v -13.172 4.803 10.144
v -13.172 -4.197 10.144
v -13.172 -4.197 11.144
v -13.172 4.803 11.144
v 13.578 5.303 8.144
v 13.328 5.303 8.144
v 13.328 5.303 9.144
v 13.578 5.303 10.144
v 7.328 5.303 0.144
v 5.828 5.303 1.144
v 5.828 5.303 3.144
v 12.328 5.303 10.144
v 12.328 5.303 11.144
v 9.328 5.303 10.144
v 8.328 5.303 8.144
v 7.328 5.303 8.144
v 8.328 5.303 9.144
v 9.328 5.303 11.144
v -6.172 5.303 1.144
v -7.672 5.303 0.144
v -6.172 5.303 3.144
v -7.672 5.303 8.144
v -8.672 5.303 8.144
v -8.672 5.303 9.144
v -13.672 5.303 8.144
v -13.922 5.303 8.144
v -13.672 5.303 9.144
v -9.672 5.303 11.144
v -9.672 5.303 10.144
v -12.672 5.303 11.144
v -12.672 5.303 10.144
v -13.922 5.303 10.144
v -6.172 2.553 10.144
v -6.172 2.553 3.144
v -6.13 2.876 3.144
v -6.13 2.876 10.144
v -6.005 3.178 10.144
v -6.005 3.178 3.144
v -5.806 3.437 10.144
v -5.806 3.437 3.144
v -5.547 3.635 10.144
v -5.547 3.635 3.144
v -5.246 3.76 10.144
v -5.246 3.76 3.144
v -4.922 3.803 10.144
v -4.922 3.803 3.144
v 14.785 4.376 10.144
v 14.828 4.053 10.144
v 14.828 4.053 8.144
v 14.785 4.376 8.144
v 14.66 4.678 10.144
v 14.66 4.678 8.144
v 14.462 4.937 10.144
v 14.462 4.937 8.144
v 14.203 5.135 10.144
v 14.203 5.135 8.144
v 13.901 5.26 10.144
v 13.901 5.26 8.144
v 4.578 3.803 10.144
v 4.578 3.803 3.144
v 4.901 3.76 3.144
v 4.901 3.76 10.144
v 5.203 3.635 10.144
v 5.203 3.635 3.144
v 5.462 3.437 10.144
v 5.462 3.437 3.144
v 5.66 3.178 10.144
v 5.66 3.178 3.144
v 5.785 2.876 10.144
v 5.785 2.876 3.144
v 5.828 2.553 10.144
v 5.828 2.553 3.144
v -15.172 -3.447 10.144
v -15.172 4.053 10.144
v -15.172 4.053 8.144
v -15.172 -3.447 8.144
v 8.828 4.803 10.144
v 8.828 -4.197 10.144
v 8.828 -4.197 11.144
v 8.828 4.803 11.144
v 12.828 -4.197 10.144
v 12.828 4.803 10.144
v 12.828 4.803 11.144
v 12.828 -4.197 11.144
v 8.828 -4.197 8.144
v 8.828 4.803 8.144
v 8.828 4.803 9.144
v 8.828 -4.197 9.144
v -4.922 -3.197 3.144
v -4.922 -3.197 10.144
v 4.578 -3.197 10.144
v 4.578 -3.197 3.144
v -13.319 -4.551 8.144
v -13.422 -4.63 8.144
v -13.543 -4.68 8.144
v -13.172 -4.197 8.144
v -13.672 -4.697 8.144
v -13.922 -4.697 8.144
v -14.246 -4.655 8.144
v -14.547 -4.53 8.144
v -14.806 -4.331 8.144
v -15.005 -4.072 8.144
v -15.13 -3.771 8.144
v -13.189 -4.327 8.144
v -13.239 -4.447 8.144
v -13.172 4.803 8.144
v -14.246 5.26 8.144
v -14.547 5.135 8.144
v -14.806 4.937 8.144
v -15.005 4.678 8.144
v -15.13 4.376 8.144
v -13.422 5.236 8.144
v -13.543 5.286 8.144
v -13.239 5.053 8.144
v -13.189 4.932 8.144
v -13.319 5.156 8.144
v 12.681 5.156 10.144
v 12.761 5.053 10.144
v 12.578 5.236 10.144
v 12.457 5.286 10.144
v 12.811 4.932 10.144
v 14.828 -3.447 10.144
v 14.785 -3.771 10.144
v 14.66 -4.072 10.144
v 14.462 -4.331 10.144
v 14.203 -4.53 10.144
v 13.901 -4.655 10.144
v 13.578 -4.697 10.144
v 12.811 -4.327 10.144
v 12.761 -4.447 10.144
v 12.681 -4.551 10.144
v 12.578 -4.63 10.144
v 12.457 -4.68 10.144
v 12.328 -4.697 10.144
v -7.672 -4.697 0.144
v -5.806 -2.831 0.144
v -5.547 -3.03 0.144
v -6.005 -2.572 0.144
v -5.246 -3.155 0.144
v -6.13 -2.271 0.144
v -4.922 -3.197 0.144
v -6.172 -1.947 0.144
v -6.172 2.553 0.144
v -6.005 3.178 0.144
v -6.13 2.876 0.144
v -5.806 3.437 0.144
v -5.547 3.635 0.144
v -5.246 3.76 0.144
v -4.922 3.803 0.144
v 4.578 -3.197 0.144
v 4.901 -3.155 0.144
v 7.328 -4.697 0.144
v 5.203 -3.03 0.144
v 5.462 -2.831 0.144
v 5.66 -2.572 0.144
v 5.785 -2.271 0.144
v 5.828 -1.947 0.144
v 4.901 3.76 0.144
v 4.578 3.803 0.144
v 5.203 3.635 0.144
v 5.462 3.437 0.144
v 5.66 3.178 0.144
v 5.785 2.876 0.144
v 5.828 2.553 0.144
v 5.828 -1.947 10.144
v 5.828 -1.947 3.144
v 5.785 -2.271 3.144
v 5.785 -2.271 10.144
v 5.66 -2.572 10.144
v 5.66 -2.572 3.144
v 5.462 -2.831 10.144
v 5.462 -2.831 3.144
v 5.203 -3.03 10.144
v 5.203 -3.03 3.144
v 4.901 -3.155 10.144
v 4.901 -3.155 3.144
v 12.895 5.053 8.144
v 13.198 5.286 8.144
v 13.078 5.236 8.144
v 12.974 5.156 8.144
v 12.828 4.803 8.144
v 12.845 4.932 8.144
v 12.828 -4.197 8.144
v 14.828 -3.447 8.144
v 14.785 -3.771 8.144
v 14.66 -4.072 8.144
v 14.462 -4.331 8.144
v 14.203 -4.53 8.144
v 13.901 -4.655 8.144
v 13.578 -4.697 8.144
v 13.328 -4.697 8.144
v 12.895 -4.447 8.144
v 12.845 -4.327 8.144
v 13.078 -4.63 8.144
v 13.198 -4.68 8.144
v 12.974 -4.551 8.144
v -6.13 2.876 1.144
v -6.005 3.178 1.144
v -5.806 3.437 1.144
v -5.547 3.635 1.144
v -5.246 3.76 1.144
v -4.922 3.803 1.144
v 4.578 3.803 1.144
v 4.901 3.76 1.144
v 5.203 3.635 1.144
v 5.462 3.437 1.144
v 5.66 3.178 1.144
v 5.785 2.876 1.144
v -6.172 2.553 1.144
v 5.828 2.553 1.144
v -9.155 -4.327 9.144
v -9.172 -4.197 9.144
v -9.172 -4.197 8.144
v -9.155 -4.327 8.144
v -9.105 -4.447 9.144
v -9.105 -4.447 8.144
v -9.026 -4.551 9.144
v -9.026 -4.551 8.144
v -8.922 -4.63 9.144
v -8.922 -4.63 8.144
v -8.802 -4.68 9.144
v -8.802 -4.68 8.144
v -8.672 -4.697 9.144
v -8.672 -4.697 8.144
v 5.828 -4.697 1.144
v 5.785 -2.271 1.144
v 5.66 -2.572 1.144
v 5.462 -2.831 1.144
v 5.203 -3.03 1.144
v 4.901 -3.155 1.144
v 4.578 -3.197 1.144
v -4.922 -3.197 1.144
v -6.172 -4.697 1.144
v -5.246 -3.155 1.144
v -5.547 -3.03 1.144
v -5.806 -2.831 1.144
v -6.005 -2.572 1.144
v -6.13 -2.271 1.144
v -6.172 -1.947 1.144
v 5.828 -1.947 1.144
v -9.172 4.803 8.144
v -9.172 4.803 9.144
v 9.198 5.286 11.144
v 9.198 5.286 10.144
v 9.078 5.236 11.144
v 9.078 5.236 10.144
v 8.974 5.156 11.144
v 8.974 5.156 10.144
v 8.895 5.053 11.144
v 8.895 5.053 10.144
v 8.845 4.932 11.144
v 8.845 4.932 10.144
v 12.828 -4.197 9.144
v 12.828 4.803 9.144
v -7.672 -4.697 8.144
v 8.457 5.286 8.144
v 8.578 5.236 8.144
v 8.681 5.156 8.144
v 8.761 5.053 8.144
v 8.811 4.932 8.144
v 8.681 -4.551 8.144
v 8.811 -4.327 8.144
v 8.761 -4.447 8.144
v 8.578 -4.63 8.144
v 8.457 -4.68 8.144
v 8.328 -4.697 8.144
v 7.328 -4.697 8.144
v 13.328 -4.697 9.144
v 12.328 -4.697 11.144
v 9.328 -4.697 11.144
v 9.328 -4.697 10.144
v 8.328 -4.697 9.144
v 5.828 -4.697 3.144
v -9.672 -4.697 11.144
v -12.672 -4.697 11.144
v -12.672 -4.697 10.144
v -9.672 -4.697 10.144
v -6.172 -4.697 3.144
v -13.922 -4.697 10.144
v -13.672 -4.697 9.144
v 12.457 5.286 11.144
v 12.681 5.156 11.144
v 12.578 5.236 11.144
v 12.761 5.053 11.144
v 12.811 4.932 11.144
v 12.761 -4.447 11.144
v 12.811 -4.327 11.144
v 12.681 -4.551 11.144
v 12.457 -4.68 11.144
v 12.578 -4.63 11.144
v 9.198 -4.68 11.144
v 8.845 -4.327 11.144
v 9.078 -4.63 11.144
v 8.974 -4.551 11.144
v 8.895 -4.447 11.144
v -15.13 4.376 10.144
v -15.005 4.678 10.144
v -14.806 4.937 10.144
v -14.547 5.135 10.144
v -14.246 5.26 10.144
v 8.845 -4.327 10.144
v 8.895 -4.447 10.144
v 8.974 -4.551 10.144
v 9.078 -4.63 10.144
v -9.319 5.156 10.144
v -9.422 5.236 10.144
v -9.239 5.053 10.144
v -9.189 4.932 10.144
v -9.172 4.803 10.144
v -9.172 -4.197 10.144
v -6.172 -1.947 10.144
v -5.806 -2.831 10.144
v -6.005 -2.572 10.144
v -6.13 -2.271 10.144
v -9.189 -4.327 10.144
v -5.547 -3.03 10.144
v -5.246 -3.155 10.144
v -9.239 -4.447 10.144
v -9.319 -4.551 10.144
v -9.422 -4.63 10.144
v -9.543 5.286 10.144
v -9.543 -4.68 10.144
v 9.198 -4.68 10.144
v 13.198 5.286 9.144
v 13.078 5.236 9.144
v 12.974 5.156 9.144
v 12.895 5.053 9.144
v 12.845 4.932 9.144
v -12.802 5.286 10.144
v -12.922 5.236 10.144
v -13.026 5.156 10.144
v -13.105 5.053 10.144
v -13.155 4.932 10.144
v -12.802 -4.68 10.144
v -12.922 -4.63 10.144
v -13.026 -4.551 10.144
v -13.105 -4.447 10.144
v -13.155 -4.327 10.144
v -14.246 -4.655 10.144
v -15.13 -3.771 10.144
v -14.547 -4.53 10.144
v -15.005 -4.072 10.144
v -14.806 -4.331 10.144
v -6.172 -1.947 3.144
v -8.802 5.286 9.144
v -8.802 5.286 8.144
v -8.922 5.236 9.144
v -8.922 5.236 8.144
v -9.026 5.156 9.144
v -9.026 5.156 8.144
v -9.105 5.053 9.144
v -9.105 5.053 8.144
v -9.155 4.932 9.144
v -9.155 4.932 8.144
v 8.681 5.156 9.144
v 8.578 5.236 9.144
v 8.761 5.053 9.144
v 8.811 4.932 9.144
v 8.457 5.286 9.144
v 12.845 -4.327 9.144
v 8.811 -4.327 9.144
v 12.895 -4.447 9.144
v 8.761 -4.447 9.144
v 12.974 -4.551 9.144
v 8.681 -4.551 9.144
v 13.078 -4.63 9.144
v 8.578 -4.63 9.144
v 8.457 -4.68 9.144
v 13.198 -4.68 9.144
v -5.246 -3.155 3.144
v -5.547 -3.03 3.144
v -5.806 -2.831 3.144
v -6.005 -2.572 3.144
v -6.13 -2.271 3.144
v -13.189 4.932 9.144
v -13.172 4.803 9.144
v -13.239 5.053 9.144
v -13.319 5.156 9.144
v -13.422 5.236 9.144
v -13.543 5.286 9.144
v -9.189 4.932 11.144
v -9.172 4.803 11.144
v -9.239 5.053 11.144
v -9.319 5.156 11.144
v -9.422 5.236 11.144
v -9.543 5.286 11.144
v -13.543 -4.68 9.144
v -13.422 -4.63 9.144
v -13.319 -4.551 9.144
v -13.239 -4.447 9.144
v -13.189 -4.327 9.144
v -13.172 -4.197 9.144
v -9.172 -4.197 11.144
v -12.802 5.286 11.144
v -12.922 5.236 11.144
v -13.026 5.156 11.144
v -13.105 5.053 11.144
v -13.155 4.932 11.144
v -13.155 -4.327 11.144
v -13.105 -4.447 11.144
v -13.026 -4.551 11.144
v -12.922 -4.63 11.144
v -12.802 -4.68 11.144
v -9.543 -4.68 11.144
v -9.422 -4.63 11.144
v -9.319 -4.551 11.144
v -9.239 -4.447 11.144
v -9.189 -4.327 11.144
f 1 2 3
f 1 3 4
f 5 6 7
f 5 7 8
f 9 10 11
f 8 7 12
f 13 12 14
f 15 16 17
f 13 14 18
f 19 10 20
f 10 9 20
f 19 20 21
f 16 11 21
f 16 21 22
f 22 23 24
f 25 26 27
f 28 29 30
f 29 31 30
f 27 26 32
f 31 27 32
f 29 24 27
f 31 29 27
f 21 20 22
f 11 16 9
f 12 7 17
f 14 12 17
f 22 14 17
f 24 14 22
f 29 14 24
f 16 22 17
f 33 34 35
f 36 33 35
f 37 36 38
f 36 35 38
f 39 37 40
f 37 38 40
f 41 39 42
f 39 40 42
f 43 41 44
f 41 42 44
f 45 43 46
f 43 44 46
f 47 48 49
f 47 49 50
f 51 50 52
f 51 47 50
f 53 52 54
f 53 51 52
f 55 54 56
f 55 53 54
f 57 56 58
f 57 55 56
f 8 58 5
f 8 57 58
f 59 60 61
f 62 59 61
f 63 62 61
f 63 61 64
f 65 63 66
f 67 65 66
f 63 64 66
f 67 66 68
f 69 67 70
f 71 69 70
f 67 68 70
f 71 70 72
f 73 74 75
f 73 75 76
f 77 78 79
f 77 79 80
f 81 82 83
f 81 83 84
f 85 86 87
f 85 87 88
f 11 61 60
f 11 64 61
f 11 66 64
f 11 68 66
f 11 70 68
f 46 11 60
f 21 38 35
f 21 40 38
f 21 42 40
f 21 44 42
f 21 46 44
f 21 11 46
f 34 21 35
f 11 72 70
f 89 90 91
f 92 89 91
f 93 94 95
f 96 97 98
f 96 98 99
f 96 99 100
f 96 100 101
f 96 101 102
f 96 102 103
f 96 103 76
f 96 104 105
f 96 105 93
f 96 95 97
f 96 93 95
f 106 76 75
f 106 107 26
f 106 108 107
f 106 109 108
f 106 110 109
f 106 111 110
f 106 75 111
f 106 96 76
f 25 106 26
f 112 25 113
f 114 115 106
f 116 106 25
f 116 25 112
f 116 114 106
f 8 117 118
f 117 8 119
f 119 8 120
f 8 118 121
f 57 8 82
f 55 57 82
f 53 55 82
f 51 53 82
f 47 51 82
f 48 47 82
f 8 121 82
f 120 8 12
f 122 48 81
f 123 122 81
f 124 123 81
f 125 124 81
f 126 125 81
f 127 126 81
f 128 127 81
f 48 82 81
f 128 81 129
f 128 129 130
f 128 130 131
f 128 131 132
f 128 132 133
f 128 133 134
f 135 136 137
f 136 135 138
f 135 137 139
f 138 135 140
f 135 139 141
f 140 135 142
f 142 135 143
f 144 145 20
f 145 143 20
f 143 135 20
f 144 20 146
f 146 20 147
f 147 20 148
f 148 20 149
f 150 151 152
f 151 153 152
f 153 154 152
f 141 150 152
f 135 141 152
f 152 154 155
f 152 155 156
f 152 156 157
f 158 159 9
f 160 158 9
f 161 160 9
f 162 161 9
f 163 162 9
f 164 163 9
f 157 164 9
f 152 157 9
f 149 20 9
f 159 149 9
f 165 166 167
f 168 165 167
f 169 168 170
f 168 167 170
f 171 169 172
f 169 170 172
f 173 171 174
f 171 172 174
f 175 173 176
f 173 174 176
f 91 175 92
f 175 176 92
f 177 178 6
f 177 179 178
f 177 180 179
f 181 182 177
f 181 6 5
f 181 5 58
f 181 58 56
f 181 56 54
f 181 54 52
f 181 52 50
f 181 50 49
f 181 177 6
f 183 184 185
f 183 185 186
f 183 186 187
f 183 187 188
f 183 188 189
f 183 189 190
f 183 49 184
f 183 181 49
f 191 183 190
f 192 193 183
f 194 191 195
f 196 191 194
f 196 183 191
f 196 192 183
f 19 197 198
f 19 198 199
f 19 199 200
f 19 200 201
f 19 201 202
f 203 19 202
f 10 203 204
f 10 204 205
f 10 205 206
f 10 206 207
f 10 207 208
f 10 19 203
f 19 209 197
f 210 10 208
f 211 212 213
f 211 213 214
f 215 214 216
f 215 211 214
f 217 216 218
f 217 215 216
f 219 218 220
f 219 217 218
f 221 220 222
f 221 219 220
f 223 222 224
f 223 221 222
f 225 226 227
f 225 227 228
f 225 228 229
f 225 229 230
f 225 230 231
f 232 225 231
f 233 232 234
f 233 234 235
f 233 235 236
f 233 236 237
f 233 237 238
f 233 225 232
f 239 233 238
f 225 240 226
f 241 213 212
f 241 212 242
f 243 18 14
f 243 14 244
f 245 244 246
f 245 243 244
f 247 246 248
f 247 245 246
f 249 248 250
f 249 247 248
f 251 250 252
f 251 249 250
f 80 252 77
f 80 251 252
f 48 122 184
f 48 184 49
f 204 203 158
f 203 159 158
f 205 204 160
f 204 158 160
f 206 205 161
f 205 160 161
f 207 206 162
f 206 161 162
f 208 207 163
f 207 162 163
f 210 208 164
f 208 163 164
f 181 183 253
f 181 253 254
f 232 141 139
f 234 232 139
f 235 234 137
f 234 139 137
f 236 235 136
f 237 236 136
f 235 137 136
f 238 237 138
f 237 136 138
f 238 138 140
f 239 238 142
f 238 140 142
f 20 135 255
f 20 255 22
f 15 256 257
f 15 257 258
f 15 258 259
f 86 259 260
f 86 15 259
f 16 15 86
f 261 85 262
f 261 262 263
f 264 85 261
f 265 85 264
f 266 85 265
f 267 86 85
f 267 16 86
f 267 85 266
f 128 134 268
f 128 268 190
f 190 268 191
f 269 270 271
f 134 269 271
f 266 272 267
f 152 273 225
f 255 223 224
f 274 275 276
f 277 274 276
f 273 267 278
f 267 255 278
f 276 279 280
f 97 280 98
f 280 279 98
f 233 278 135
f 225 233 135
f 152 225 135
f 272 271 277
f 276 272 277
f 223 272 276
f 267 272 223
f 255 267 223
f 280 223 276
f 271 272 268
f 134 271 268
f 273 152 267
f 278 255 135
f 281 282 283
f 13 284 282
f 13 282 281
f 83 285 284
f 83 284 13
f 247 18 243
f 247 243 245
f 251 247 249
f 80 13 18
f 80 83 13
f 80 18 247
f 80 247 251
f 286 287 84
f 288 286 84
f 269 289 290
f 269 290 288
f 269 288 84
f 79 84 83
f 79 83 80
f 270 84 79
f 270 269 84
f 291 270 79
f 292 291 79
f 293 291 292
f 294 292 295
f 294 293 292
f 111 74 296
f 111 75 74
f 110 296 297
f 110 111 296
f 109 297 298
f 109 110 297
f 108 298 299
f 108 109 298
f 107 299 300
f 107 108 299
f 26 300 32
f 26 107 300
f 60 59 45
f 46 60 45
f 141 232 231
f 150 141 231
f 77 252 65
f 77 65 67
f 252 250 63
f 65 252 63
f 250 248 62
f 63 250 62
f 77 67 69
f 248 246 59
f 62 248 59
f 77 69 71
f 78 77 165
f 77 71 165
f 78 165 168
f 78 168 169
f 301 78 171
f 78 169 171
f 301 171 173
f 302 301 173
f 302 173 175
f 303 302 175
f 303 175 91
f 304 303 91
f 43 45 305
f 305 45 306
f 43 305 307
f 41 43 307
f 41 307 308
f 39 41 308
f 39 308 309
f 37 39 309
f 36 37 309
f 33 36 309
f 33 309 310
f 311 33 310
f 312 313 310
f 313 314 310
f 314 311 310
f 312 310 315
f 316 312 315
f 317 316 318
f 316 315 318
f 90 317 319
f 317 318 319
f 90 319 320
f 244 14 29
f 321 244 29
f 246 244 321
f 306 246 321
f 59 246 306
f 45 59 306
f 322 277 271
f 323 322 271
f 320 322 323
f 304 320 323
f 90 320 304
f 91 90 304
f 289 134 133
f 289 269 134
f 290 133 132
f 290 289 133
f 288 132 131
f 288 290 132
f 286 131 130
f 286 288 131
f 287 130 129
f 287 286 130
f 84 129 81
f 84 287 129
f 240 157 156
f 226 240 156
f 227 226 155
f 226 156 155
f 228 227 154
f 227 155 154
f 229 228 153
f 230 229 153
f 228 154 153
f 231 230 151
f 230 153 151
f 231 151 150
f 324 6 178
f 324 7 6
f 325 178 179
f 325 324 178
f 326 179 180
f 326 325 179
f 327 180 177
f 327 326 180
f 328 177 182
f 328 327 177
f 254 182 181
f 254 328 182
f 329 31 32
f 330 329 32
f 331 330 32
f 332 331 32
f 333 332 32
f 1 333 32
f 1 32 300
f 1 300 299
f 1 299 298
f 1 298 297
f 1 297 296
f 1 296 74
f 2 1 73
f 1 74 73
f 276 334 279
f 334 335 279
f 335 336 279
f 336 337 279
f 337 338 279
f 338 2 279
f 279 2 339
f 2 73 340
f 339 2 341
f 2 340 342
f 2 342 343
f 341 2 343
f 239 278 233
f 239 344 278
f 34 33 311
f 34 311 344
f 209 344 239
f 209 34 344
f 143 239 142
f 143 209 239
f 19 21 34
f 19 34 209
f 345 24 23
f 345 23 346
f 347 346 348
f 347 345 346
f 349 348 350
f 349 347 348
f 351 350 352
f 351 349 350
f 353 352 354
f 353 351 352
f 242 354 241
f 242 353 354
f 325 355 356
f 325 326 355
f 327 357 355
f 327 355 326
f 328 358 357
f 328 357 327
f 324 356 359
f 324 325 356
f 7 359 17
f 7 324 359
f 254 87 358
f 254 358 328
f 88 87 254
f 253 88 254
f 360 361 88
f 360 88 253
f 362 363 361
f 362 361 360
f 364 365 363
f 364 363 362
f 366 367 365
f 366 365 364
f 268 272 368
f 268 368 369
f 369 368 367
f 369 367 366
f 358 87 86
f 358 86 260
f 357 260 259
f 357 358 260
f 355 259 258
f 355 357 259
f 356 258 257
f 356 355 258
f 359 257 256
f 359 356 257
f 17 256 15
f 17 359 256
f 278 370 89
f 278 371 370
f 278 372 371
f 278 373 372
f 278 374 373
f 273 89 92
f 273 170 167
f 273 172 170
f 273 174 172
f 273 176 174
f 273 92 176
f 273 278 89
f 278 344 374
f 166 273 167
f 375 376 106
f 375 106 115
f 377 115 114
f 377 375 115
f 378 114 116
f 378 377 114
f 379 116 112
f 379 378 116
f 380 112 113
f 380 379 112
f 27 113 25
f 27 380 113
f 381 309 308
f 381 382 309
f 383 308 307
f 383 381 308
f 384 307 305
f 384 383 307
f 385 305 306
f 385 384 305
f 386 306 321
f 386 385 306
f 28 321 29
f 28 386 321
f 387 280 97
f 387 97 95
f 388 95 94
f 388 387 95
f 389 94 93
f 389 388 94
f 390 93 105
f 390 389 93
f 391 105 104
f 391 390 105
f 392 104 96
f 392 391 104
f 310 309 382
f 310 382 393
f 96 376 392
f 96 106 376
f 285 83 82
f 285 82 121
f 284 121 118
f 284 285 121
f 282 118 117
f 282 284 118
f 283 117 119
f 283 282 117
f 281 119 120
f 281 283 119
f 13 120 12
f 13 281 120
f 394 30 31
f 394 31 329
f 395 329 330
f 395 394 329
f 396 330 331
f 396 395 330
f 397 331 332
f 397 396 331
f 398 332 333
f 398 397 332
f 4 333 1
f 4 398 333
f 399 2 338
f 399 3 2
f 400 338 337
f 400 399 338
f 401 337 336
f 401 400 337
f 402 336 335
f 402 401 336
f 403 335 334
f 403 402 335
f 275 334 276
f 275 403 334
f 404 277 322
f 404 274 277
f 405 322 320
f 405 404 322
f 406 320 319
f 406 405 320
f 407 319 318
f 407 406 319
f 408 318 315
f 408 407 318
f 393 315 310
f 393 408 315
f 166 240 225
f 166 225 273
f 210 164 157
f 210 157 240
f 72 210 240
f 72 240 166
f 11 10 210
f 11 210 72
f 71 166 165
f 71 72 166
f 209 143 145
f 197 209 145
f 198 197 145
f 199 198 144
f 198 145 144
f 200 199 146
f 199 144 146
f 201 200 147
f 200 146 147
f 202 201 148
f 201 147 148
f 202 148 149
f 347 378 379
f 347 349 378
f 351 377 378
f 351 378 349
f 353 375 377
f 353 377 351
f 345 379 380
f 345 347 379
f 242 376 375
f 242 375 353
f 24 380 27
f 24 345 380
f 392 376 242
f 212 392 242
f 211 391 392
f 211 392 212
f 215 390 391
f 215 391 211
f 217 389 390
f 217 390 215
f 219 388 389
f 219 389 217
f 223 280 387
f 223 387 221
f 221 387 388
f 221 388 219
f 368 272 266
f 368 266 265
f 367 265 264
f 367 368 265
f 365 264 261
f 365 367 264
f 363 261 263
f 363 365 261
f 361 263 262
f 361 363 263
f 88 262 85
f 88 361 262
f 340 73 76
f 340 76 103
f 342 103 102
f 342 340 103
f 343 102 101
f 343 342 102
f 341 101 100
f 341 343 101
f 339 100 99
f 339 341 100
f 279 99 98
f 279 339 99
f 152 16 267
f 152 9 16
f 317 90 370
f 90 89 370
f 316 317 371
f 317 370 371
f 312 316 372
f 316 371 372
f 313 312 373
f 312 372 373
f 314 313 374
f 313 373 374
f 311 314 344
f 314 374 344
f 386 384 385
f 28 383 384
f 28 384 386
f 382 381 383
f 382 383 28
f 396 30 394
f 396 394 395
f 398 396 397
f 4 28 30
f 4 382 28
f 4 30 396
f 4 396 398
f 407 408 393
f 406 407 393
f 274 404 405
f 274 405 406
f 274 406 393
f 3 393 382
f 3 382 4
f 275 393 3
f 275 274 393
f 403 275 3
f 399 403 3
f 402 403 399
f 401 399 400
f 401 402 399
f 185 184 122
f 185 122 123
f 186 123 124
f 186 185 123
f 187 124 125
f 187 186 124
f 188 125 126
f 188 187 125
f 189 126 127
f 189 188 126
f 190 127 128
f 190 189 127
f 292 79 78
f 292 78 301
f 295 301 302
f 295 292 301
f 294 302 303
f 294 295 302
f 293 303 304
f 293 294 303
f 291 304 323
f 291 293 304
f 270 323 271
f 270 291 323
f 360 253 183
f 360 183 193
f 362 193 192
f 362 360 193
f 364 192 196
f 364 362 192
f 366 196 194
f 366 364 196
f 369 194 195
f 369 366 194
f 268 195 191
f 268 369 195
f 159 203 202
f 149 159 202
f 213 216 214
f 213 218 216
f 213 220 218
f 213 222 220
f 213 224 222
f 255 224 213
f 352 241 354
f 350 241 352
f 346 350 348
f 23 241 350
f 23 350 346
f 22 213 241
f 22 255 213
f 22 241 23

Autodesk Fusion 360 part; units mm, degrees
sketch "Sketch1" plane through (0, 0, 0) normal (0, 0, 1) x (1, 0, 0) in component "Headpost"
  line L0 (7.5, -5) -> (-7.5, -5)
  line L1 (-7.5, -5) -> (-7.5, 5)
  line L2 (-7.5, 5) -> (7.5, 5)
  line L3 (7.5, 5) -> (7.5, -5)
  line L4 (7.5, -5) -> (-7.5, 5) construction
  line L5 (-7.5, -5) -> (7.5, 5) construction
  dimension "d1" = 15
  dimension "d2" = 10
extrude "Extrude1" add sketch "Sketch1" along normal blind 10 in component "Headpost"
sketch "Sketch2" plane through (0, 0, 10) normal (0, 0, 1) x (-1, 0, 0) in component "Headpost"
  line L0 (-7.5, -5) -> (7.5, -5)
  line L1 (7.5, -5) -> (7.5, 5)
  line L2 (7.5, 5) -> (-7.5, 5)
  line L3 (-7.5, 5) -> (-7.5, -5)
  line L4 (6, 3.5) -> (-6, 3.5)
  line L5 (-6, 3.5) -> (-6, -3.5)
  line L6 (-6, -3.5) -> (6, -3.5)
  line L7 (6, -3.5) -> (6, 3.5)
  dimension "d5" = -1.5
extrude "Extrude2" cut sketch "Sketch2" against normal blind 15 contours L4 L5 L6 L7 in component "Headpost"
sketch "Sketch3" plane through (-7.5, 0, 0) normal (-1, 0, 0) x (0, -1, 0) in component "Headpost"
  line L0 (-5, 0) -> (5, 0)
  line L1 (5, 0) -> (5, 10)
  line L2 (5, 10) -> (-5, 10)
  line L3 (-5, 10) -> (-5, 0)
  line L4 (-5, 10) -> (5, 10)
  line L5 (5, 10) -> (5, 8)
  line L6 (5, 8) -> (-5, 8)
  line L7 (-5, 8) -> (-5, 10)
  dimension "d8" = 10
  dimension "d9" = 2
extrude "Extrude3" add sketch "Sketch3" along normal blind 7.5 contours L1 L2 L3 L4 L5 L6 L7 in component "Headpost"
sketch "Sketch4" plane through (7.5, 0, 0) normal (1, 0, 0) x (0, 1, 0) in component "Headpost"
  line L0 (-5, 0) -> (5, 0)
  line L1 (5, 0) -> (5, 10)
  line L2 (5, 10) -> (-5, 10)
  line L3 (-5, 10) -> (-5, 0)
  line L4 (-5, 10) -> (5, 10)
  line L5 (5, 10) -> (5, 8)
  line L6 (5, 8) -> (-5, 8)
  line L7 (-5, 8) -> (-5, 10)
  dimension "d12" = 2
extrude "Extrude4" add sketch "Sketch4" along normal blind 7.5 contours L1 L2 L3 L4 L5 L6 L7 in component "Headpost"
fillet "Fillet1" radius 1.25 2 edges at (6, -3.5, 5) (6, 3.5, 5) in component "Headpost"
fillet "Fillet2" radius 1.25 2 edges at (-6, 3.5, 5) (-6, -3.5, 5) in component "Headpost"
fillet "Fillet3" radius 1.25 4 edges at (15, -5, 9) (15, 5, 9) (-15, 5, 9) (-15, -5, 9) in component "Headpost"
sketch "Sketch5" plane through (0, 0, 10) normal (0, 0, 1) x (-1, 0, 0) in component "Headpost"
  arc A0 (15, 3.75) -> (13.75, 5) centre (13.75, 3.75) ccw
  line L0 (13.75, 5) -> (-13.75, 5)
  arc A1 (-13.75, 5) -> (-15, 3.75) centre (-13.75, 3.75) ccw
  line L1 (-15, 3.75) -> (-15, -3.75)
  arc A2 (-15, -3.75) -> (-13.75, -5) centre (-13.75, -3.75) ccw
  line L2 (-13.75, -5) -> (13.75, -5)
  arc A3 (13.75, -5) -> (15, -3.75) centre (13.75, -3.75) ccw
  line L3 (15, -3.75) -> (15, 3.75)
  line L4 (-4.75, 3.5) -> (4.75, 3.5)
  arc A4 (6, 2.25) -> (4.75, 3.5) centre (4.75, 2.25) ccw
  line L5 (6, 2.25) -> (6, -2.25)
  arc A5 (4.75, -3.5) -> (6, -2.25) centre (4.75, -2.25) ccw
  line L6 (4.75, -3.5) -> (-4.75, -3.5)
  arc A6 (-6, -2.25) -> (-4.75, -3.5) centre (-4.75, -2.25) ccw
  line L7 (-6, -2.25) -> (-6, 2.25)
  arc A7 (-4.75, 3.5) -> (-6, 2.25) centre (-4.75, 2.25) ccw
  line L8 (13, -5) -> (9, -5)
  line L9 (9, -5) -> (9, 5)
  line L10 (9, 5) -> (13, 5)
  line L11 (13, 5) -> (13, -5)
  line L12 (-9, -5) -> (-13, -5)
  line L13 (-13, -5) -> (-13, 5)
  line L14 (-13, 5) -> (-9, 5)
  line L15 (-9, 5) -> (-9, -5)
  dimension "d21" = 4
  dimension "d22" = 10
  dimension "d23" = 3
  dimension "d24" = 4
  dimension "d25" = 10
  dimension "d26" = 3
extrude "Extrude5" add sketch "Sketch5" along normal blind 1 contours L0 L2 L8 L9 L10 L11 in component "Headpost"
sketch "Sketch6" plane through (0, 0, 10) normal (0, 0, 1) x (-1, 0, 0) in component "Headpost"
  line L0 (-4.75, 3.5) -> (4.75, 3.5)
  arc A0 (6, 2.25) -> (4.75, 3.5) centre (4.75, 2.25) ccw
  line L1 (6, 2.25) -> (6, -2.25)
  arc A1 (4.75, -3.5) -> (6, -2.25) centre (4.75, -2.25) ccw
  line L2 (4.75, -3.5) -> (-4.75, -3.5)
  arc A2 (-6, -2.25) -> (-4.75, -3.5) centre (-4.75, -2.25) ccw
  line L3 (-6, -2.25) -> (-6, 2.25)
  arc A3 (-4.75, 3.5) -> (-6, 2.25) centre (-4.75, 2.25) ccw
  line L4 (9, -5) -> (9, 5)
  line L5 (9, 5) -> (-13.75, 5)
  arc A4 (-13.75, 5) -> (-15, 3.75) centre (-13.75, 3.75) ccw
  line L6 (-15, 3.75) -> (-15, -3.75)
  arc A5 (-15, -3.75) -> (-13.75, -5) centre (-13.75, -3.75) ccw
  line L7 (-13.75, -5) -> (9, -5)
  line L8 (-9, -5) -> (-13, -5)
  line L9 (-13, -5) -> (-13, 5)
  line L10 (-13, 5) -> (-9, 5)
  line L11 (-9, 5) -> (-9, -5)
  dimension "d29" = 4
  dimension "d30" = 10
  dimension "d31" = 3
extrude "Extrude6" add sketch "Sketch6" along normal blind 1 contours L5 L7 L8 L9 L10 L11 in component "Headpost"
fillet "Fillet4" radius 0.5 2 edges at (-13, -5, 10.5) (-9, -5, 10.5) in component "Headpost"
fillet "Fillet5" radius 0.5 2 edges at (9, -5, 10.5) (13, -5, 10.5) in component "Headpost"
fillet "Fillet6" radius 0.5 2 edges at (13, 5, 10.5) (9, 5, 10.5) in component "Headpost"
fillet "Fillet7" radius 0.5 2 edges at (-9, 5, 10.5) (-13, 5, 10.5) in component "Headpost"
sketch "Sketch7" plane through (0, 5, 0) normal (0, 1, 0) x (-1, 0, 0) in component "Headpost"
  line L0 (13.75, 10) -> (12.5, 10)
  line L1 (12.5, 10) -> (12.5, 11)
  line L2 (12.5, 11) -> (9.5, 11)
  line L3 (9.5, 11) -> (9.5, 10)
  line L4 (9.5, 10) -> (-9.5, 10)
  line L5 (-9.5, 10) -> (-9.5, 11)
  line L6 (-9.5, 11) -> (-12.5, 11)
  line L7 (-12.5, 11) -> (-12.5, 10)
  line L8 (-12.5, 10) -> (-13.75, 10)
  line L9 (-13.75, 10) -> (-13.75, 8)
  line L10 (-13.75, 8) -> (-7.5, 8)
  line L11 (-7.5, 8) -> (-7.5, 0)
  line L12 (-7.5, 0) -> (7.5, 0)
  line L13 (7.5, 0) -> (7.5, 8)
  line L14 (7.5, 8) -> (13.75, 8)
  line L15 (13.75, 8) -> (13.75, 10)
  line L16 (-6, 3) -> (6, 3)
  line L17 (6, 3) -> (6, 1)
  line L18 (6, 1) -> (-6, 1)
  line L19 (-6, 1) -> (-6, 3)
  dimension "d42" = 2
extrude "Extrude7" cut sketch "Sketch7" against normal blind 3 contours L16 L17 L18 L19 in component "Headpost"
sketch "Sketch8" plane through (0, -5, 0) normal (0, -1, 0) x (1, 0, 0) in component "Headpost"
  line L0 (13.75, 10) -> (12.5, 10)
  line L1 (12.5, 10) -> (12.5, 11)
  line L2 (12.5, 11) -> (9.5, 11)
  line L3 (9.5, 11) -> (9.5, 10)
  line L4 (9.5, 10) -> (-9.5, 10)
  line L5 (-9.5, 10) -> (-9.5, 11)
  line L6 (-9.5, 11) -> (-12.5, 11)
  line L7 (-12.5, 11) -> (-12.5, 10)
  line L8 (-12.5, 10) -> (-13.75, 10)
  line L9 (-13.75, 10) -> (-13.75, 8)
  line L10 (-13.75, 8) -> (-7.5, 8)
  line L11 (-7.5, 8) -> (-7.5, 0)
  line L12 (-7.5, 0) -> (7.5, 0)
  line L13 (7.5, 0) -> (7.5, 8)
  line L14 (7.5, 8) -> (13.75, 8)
  line L15 (13.75, 8) -> (13.75, 10)
  line L16 (-6, 3) -> (6, 3)
  line L17 (6, 3) -> (6, 1)
  line L18 (6, 1) -> (-6, 1)
  line L19 (-6, 1) -> (-6, 3)
  dimension "d45" = 2
extrude "Extrude8" cut sketch "Sketch8" against normal blind 3 contours L16 L17 L18 L19 in component "Headpost"
sketch "Sketch11" plane through (0, 0, 8) normal (0, 0, -1) x (1, 0, 0) in component "Headpost"
  arc A0 (13.75, -5) -> (15, -3.75) centre (13.75, -3.75) ccw
  line L0 (15, -3.75) -> (15, 3.75)
  arc A1 (15, 3.75) -> (13.75, 5) centre (13.75, 3.75) ccw
  line L1 (13.75, 5) -> (7.5, 5)
  line L2 (7.5, 5) -> (7.5, -5)
  line L3 (7.5, -5) -> (13.75, -5)
  line L4 (-13, 5) -> (-9, 5)
  line L5 (-9, 5) -> (-9, -5)
  line L6 (-9, -5) -> (-13, -5)
  line L7 (-13, -5) -> (-13, 5)
  line L8 (-15, -3.75) -> (-15, 3.75)
  dimension "d48" = 4
  dimension "d49" = 10
  dimension "d50" = 2
extrude "Extrude9" cut sketch "Sketch11" against normal blind 1 contours L4 L5 L6 L7 in component "Headpost"
fillet "Fillet8" radius 0.5 4 edges at (-9, 5, 8.5) (-13, 5, 8.5) (-13, -5, 8.5) (-9, -5, 8.5) in component "Headpost"
sketch "Sketch12" plane through (0, 0, 8) normal (0, 0, -1) x (1, 0, 0) in component "Headpost"
  arc A0 (13.75, -5) -> (15, -3.75) centre (13.75, -3.75) ccw
  line L0 (15, -3.75) -> (15, 3.75)
  arc A1 (15, 3.75) -> (13.75, 5) centre (13.75, 3.75) ccw
  line L1 (13.75, 5) -> (7.5, 5)
  line L2 (7.5, 5) -> (7.5, -5)
  line L3 (7.5, -5) -> (13.75, -5)
  line L4 (9, 5) -> (13, 5)
  line L5 (13, 5) -> (13, -5)
  line L6 (13, -5) -> (9, -5)
  line L7 (9, -5) -> (9, 5)
  dimension "d55" = 4
  dimension "d56" = 10
  dimension "d57" = 2
extrude "Extrude10" cut sketch "Sketch12" against normal blind 1 contours L1 L3 L4 L5 L6 L7 in component "Headpost"
fillet "Fillet9" radius 0.5 4 edges at (13, 5, 8.5) (9, 5, 8.5) (9, -5, 8.5) (13, -5, 8.5) in component "Headpost"
sketch "Sketch9" plane through (0, 0, 0) normal (1, 0, 0) x (0, 1, 0) in component "Headpost"
component "Headpost" placed x (1, 0, 0) y (0, 1, 0) z (0, 0, 1) at (-0.1721, 0.3027, 0.1438)
